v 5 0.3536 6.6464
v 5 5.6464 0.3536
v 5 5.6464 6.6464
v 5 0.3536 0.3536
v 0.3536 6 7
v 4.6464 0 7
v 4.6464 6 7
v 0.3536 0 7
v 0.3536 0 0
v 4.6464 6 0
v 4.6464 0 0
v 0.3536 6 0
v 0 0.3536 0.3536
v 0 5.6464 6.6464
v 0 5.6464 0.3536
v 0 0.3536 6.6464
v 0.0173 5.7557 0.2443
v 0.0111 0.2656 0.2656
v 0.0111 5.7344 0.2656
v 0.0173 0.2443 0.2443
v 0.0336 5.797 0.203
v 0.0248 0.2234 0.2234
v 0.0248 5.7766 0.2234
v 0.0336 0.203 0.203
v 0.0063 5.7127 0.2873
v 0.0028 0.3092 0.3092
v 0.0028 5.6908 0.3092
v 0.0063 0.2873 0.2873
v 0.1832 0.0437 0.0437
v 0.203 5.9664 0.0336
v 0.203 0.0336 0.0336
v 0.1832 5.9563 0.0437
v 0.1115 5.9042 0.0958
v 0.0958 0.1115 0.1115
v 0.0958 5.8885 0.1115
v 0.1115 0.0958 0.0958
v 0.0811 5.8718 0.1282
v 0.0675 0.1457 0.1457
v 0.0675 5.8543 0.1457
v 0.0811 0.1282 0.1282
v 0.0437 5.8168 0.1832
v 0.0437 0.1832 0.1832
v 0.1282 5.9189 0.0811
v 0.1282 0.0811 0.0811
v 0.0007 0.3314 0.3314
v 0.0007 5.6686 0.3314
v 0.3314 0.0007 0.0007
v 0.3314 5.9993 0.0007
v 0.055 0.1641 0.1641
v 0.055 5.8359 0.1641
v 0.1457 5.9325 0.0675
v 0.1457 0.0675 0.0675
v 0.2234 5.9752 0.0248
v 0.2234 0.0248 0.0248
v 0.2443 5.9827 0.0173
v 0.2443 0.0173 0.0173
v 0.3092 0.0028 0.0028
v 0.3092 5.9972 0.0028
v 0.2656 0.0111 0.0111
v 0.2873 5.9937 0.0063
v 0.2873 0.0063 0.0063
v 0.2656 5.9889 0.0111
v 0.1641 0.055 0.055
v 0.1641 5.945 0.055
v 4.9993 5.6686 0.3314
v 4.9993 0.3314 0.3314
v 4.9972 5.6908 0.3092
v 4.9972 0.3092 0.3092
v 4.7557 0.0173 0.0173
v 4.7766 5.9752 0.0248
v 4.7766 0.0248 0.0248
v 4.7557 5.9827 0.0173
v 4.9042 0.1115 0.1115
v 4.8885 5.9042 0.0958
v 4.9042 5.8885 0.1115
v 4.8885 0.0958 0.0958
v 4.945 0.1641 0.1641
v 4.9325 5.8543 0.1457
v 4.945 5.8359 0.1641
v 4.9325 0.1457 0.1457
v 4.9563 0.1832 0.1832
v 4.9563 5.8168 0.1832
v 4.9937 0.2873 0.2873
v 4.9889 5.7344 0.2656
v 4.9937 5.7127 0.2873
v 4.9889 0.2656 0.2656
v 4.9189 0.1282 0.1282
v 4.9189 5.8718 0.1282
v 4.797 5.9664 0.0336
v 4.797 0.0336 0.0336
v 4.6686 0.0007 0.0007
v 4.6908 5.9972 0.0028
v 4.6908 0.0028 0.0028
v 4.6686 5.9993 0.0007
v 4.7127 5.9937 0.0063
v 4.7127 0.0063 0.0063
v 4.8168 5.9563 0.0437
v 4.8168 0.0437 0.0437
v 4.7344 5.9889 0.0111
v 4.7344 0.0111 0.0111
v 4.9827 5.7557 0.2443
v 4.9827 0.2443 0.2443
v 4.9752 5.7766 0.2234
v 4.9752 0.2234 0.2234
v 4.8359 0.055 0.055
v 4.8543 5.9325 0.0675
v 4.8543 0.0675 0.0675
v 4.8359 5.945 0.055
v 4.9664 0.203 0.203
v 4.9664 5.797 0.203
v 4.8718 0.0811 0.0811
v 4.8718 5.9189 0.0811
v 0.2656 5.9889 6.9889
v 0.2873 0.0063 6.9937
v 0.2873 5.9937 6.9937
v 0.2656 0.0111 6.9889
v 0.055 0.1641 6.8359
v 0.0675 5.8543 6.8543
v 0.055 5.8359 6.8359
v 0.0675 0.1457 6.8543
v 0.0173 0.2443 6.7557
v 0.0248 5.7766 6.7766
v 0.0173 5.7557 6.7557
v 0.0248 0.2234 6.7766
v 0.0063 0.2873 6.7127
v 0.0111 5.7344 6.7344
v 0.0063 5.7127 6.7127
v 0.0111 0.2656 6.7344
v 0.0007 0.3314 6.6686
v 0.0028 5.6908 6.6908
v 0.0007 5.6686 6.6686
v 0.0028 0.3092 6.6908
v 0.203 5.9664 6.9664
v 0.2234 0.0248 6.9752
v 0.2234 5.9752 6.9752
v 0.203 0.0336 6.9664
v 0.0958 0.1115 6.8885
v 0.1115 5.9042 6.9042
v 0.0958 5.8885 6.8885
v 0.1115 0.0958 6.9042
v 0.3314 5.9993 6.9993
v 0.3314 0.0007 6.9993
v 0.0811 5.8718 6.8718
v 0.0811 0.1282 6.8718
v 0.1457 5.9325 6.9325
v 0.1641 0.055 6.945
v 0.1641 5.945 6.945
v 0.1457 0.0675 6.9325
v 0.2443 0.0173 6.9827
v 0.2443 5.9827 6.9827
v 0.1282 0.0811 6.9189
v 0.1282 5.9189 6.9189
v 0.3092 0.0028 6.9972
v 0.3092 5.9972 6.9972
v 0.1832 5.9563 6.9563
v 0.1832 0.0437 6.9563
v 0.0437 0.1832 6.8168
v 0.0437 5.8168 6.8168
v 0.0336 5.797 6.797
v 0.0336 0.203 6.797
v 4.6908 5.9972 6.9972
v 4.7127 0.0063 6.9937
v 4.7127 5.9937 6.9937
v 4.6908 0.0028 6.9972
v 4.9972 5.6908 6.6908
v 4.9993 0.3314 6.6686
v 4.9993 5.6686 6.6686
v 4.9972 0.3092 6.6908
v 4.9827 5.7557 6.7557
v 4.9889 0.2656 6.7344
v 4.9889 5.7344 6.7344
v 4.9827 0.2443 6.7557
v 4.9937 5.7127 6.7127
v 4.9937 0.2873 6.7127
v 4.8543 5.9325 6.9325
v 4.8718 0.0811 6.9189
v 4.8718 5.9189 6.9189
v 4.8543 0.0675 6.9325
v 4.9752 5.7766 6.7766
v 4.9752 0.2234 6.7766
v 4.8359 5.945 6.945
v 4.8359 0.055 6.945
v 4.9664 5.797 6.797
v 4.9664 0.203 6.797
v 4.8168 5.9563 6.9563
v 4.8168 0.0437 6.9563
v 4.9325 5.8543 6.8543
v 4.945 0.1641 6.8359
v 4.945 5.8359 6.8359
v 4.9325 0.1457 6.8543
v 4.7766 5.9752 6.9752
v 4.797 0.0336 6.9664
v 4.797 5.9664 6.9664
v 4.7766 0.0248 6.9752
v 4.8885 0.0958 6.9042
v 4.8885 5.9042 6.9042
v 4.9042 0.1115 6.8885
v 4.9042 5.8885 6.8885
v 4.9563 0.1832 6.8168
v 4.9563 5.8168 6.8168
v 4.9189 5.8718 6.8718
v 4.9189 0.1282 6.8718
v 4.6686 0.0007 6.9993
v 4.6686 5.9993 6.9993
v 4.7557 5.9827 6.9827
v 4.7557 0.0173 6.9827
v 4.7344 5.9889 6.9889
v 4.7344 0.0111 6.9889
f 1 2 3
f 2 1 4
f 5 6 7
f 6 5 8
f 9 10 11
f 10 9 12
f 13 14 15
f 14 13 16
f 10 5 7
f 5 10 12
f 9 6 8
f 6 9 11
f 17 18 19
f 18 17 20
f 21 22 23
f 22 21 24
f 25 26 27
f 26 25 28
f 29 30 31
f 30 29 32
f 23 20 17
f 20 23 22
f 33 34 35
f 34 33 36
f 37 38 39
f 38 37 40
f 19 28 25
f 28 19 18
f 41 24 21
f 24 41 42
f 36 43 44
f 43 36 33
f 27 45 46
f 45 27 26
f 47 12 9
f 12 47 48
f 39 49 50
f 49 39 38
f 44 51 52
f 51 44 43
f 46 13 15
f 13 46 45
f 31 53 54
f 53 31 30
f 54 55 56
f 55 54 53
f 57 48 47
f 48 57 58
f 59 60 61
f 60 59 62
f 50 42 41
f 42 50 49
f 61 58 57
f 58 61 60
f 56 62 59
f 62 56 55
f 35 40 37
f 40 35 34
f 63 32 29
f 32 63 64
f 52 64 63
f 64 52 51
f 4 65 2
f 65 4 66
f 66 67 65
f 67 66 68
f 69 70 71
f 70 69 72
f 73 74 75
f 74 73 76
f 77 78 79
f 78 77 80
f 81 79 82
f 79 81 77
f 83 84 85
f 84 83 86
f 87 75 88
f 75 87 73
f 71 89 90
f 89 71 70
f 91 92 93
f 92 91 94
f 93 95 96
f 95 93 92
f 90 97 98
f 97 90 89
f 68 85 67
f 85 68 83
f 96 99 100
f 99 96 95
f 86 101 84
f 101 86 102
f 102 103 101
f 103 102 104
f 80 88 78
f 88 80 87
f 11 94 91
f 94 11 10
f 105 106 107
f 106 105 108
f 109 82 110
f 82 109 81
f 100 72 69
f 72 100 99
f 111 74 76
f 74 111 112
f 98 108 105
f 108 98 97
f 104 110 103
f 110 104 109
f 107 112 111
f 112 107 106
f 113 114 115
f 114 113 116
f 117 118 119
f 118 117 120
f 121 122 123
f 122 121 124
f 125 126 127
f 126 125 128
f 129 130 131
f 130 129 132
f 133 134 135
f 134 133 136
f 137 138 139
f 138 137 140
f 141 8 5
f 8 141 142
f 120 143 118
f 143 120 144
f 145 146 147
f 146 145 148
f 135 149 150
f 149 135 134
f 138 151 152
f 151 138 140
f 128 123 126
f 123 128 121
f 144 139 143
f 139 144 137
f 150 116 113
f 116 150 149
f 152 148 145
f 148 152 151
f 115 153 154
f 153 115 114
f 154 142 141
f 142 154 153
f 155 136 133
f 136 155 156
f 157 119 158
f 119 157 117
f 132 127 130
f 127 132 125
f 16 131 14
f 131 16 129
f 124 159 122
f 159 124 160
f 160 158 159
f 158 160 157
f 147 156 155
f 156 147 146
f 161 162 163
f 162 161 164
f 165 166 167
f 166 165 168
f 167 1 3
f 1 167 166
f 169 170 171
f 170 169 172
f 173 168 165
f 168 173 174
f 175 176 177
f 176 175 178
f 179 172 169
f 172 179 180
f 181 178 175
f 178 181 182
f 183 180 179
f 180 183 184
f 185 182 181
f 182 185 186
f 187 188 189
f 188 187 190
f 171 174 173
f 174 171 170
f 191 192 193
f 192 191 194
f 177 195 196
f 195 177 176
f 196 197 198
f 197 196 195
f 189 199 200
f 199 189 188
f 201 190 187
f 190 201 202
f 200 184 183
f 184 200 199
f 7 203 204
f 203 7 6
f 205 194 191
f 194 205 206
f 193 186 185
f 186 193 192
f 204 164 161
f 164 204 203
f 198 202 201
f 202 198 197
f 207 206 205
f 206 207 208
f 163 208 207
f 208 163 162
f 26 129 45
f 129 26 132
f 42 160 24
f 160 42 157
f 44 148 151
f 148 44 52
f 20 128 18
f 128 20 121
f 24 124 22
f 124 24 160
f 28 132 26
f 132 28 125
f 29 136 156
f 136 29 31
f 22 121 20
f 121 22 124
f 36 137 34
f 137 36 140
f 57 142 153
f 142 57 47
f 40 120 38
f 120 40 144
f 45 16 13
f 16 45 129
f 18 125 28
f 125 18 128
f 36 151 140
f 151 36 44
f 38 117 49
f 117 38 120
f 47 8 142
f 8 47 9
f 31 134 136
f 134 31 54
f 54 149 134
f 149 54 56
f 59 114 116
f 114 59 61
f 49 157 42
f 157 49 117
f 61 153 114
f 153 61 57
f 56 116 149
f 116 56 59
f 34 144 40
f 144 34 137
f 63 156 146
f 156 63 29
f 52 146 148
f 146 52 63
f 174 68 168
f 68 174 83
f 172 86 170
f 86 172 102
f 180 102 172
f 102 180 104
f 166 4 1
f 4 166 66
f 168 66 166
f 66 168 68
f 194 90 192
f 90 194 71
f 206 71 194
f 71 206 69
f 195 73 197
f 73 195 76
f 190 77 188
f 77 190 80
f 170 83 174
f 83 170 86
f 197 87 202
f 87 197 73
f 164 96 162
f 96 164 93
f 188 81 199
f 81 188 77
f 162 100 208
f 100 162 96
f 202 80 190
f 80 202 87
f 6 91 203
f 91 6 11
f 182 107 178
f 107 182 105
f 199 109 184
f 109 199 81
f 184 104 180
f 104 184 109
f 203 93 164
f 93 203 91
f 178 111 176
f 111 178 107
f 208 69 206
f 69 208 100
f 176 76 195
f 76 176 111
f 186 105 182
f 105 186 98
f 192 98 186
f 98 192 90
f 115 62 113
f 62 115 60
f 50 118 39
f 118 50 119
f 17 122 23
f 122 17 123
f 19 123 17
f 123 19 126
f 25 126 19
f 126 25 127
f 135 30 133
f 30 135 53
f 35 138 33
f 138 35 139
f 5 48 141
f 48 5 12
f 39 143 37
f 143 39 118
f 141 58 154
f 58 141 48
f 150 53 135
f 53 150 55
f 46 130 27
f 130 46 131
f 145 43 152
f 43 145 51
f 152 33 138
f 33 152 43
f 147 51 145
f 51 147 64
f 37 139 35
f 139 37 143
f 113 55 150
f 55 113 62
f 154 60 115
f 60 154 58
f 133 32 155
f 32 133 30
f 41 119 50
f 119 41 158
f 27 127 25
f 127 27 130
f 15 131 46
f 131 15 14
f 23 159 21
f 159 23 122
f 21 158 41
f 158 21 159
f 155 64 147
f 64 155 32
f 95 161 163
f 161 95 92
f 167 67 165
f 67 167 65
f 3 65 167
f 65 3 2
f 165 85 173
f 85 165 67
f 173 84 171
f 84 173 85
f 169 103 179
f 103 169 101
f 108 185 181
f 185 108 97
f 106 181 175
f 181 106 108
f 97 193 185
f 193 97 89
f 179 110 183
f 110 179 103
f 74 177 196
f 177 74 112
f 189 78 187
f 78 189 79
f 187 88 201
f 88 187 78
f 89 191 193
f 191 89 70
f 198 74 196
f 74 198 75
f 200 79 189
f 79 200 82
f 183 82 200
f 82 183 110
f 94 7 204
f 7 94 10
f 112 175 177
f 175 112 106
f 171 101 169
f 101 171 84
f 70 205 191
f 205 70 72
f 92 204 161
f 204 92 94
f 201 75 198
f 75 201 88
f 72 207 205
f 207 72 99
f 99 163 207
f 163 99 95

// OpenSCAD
//
// utility functions (currently only beveled cube)
//

$fs = 0.01;
$fn = 100;

inf = 1 / 0; // positive infinity

/*
 cube_dims = [x, y, z]            : dimensions of cube to be beveled
 axes = [{0, 1}, {0, 1}, {0, 1}]  : whether to bevel edges perpendicular to corresponding axis
 ratio = (0, 0.707]                 : ratio of smallest (active) side length to bevel by
 */
module beveled_cube(cube_dims, axes, ratio = 0.1) {
    x = cube_dims[0];
    y = cube_dims[1];
    z = cube_dims[2];
    
    ax = axes[0] != 0;
    ay = axes[1] != 0;
    az = axes[2] != 0;
    
    r = min(ax ? min(y, z) : x, ay ? min(x, z) : y, az ? min(x, y) : z) * ratio;
    c = r / sqrt(2);
    
    difference() {
        cube(cube_dims);
        
        // 45-deg cuts
        union() {
            if (ax) {
                translate([x / 2, 0, 0]) rotate([45, 0, 0]) cube([x + 0.05, r, r], center = true);
                translate([x / 2, y, 0]) rotate([45, 0, 0]) cube([x + 0.05, r, r], center = true);
                translate([x / 2, 0, z]) rotate([45, 0, 0]) cube([x + 0.05, r, r], center = true);
                translate([x / 2, y, z]) rotate([45, 0, 0]) cube([x + 0.05, r, r], center = true);
            }
            
            if (ay) {
                translate([0, y / 2, 0]) rotate([0, 45, 0]) cube([r, y + 0.05, r], center = true);
                translate([x, y / 2, 0]) rotate([0, 45, 0]) cube([r, y + 0.05, r], center = true);
                translate([0, y / 2, z]) rotate([0, 45, 0]) cube([r, y + 0.05, r], center = true);
                translate([x, y / 2, z]) rotate([0, 45, 0]) cube([r, y + 0.05, r], center = true);
            }
            
            if (az) {
                translate([0, 0, z / 2]) rotate([0, 0, 45]) cube([r, r, z + 0.05], center = true);
                translate([x, 0, z / 2]) rotate([0, 0, 45]) cube([r, r, z + 0.05], center = true);
                translate([0, y, z / 2]) rotate([0, 0, 45]) cube([r, r, z + 0.05], center = true);
                translate([x, y, z / 2]) rotate([0, 0, 45]) cube([r, r, z + 0.05], center = true);
            }
        }
    }
    
    // bevels, always use spheres on corners (this is wrong probably complicated to make precise)
    if (ax) {
        shorter = ay || az;
        
        translate([x / 2, c,     c    ]) rotate([0, 90, 0]) cylinder(r = c, h = shorter ? x - 2 * c : x, center = true);
        translate([x / 2, y - c, c    ]) rotate([0, 90, 0]) cylinder(r = c, h = shorter ? x - 2 * c : x, center = true);
        translate([x / 2, c,     z - c]) rotate([0, 90, 0]) cylinder(r = c, h = shorter ? x - 2 * c : x, center = true);
        translate([x / 2, y - c, z - c]) rotate([0, 90, 0]) cylinder(r = c, h = shorter ? x - 2 * c : x, center = true);
    }
    
    if (ay) {
        shorter = ax || az;
        
        translate([c,     y / 2, c    ]) rotate([90, 0, 0]) cylinder(r = c, h = shorter ? y - 2 * c : y, center = true);
        translate([x - c, y / 2, c    ]) rotate([90, 0, 0]) cylinder(r = c, h = shorter ? y - 2 * c : y, center = true);
        translate([c,     y / 2, z - c]) rotate([90, 0, 0]) cylinder(r = c, h = shorter ? y - 2 * c : y, center = true);
        translate([x - c, y / 2, z - c]) rotate([90, 0, 0]) cylinder(r = c, h = shorter ? y - 2 * c : y, center = true);
    }
    
    if (az) {
        shorter = ax || ay;
        
        translate([c,     c,     z / 2]) cylinder(r = c, h = shorter ? z - 2 * c : z, center = true);
        translate([x - c, c,     z / 2]) cylinder(r = c, h = shorter ? z - 2 * c : z, center = true);
        translate([c,     y - c, z / 2]) cylinder(r = c, h = shorter ? z - 2 * c : z, center = true);
        translate([x - c, y - c, z / 2]) cylinder(r = c, h = shorter ? z - 2 * c : z, center = true);
    }
    
    // just use spheres if all axes are to be beveled
    if (ax && ay && az) {
        translate([c,     c,     c    ]) sphere(r = c);
        translate([c,     c,     z - c]) sphere(r = c);
        translate([c,     y - c, c    ]) sphere(r = c);
        translate([c,     y - c, z - c]) sphere(r = c);
        translate([x - c, c,     c    ]) sphere(r = c);
        translate([x - c, c,     z - c]) sphere(r = c);
        translate([x - c, y - c, c    ]) sphere(r = c);
        translate([x - c, y - c, z - c]) sphere(r = c);
    } else { // otherwise we use the intersection of two cylinders for paired axes
        for (nx = [c, x - c]) {
            for (ny = [c, y - c]) {
                for (nz = [c, z - c]) {
                    if (ax && ay) {
                        intersection() {
                            translate([x / 2, ny, nz]) rotate([0, 90, 0]) cylinder(r = c, h = x, center = true);
                            translate([nx, y / 2, nz]) rotate([90, 0, 0]) cylinder(r = c, h = y, center = true);
                        }
                    } else if (ax && az) {
                        intersection() {
                            translate([nx, ny, z / 2]) cylinder(r = c, h = z, center = true);
                            translate([x / 2, ny, nz]) rotate([0, 90, 0]) cylinder(r = c, h = x, center = true);
                        }
                    } else if (ay && az) {
                        intersection() {
                            translate([nx, ny, z / 2]) cylinder(r = c, h = z, center = true);
                            translate([nx, y / 2, nz]) rotate([90, 0, 0]) cylinder(r = c, h = y, center = true);
                        }
                    }
                }
            }
        }
    } // otherwise we dont add anything (length of cylinder is conditionally adjusted)
}

beveled_cube([5, 6, 7], [0, 1, 1]);
